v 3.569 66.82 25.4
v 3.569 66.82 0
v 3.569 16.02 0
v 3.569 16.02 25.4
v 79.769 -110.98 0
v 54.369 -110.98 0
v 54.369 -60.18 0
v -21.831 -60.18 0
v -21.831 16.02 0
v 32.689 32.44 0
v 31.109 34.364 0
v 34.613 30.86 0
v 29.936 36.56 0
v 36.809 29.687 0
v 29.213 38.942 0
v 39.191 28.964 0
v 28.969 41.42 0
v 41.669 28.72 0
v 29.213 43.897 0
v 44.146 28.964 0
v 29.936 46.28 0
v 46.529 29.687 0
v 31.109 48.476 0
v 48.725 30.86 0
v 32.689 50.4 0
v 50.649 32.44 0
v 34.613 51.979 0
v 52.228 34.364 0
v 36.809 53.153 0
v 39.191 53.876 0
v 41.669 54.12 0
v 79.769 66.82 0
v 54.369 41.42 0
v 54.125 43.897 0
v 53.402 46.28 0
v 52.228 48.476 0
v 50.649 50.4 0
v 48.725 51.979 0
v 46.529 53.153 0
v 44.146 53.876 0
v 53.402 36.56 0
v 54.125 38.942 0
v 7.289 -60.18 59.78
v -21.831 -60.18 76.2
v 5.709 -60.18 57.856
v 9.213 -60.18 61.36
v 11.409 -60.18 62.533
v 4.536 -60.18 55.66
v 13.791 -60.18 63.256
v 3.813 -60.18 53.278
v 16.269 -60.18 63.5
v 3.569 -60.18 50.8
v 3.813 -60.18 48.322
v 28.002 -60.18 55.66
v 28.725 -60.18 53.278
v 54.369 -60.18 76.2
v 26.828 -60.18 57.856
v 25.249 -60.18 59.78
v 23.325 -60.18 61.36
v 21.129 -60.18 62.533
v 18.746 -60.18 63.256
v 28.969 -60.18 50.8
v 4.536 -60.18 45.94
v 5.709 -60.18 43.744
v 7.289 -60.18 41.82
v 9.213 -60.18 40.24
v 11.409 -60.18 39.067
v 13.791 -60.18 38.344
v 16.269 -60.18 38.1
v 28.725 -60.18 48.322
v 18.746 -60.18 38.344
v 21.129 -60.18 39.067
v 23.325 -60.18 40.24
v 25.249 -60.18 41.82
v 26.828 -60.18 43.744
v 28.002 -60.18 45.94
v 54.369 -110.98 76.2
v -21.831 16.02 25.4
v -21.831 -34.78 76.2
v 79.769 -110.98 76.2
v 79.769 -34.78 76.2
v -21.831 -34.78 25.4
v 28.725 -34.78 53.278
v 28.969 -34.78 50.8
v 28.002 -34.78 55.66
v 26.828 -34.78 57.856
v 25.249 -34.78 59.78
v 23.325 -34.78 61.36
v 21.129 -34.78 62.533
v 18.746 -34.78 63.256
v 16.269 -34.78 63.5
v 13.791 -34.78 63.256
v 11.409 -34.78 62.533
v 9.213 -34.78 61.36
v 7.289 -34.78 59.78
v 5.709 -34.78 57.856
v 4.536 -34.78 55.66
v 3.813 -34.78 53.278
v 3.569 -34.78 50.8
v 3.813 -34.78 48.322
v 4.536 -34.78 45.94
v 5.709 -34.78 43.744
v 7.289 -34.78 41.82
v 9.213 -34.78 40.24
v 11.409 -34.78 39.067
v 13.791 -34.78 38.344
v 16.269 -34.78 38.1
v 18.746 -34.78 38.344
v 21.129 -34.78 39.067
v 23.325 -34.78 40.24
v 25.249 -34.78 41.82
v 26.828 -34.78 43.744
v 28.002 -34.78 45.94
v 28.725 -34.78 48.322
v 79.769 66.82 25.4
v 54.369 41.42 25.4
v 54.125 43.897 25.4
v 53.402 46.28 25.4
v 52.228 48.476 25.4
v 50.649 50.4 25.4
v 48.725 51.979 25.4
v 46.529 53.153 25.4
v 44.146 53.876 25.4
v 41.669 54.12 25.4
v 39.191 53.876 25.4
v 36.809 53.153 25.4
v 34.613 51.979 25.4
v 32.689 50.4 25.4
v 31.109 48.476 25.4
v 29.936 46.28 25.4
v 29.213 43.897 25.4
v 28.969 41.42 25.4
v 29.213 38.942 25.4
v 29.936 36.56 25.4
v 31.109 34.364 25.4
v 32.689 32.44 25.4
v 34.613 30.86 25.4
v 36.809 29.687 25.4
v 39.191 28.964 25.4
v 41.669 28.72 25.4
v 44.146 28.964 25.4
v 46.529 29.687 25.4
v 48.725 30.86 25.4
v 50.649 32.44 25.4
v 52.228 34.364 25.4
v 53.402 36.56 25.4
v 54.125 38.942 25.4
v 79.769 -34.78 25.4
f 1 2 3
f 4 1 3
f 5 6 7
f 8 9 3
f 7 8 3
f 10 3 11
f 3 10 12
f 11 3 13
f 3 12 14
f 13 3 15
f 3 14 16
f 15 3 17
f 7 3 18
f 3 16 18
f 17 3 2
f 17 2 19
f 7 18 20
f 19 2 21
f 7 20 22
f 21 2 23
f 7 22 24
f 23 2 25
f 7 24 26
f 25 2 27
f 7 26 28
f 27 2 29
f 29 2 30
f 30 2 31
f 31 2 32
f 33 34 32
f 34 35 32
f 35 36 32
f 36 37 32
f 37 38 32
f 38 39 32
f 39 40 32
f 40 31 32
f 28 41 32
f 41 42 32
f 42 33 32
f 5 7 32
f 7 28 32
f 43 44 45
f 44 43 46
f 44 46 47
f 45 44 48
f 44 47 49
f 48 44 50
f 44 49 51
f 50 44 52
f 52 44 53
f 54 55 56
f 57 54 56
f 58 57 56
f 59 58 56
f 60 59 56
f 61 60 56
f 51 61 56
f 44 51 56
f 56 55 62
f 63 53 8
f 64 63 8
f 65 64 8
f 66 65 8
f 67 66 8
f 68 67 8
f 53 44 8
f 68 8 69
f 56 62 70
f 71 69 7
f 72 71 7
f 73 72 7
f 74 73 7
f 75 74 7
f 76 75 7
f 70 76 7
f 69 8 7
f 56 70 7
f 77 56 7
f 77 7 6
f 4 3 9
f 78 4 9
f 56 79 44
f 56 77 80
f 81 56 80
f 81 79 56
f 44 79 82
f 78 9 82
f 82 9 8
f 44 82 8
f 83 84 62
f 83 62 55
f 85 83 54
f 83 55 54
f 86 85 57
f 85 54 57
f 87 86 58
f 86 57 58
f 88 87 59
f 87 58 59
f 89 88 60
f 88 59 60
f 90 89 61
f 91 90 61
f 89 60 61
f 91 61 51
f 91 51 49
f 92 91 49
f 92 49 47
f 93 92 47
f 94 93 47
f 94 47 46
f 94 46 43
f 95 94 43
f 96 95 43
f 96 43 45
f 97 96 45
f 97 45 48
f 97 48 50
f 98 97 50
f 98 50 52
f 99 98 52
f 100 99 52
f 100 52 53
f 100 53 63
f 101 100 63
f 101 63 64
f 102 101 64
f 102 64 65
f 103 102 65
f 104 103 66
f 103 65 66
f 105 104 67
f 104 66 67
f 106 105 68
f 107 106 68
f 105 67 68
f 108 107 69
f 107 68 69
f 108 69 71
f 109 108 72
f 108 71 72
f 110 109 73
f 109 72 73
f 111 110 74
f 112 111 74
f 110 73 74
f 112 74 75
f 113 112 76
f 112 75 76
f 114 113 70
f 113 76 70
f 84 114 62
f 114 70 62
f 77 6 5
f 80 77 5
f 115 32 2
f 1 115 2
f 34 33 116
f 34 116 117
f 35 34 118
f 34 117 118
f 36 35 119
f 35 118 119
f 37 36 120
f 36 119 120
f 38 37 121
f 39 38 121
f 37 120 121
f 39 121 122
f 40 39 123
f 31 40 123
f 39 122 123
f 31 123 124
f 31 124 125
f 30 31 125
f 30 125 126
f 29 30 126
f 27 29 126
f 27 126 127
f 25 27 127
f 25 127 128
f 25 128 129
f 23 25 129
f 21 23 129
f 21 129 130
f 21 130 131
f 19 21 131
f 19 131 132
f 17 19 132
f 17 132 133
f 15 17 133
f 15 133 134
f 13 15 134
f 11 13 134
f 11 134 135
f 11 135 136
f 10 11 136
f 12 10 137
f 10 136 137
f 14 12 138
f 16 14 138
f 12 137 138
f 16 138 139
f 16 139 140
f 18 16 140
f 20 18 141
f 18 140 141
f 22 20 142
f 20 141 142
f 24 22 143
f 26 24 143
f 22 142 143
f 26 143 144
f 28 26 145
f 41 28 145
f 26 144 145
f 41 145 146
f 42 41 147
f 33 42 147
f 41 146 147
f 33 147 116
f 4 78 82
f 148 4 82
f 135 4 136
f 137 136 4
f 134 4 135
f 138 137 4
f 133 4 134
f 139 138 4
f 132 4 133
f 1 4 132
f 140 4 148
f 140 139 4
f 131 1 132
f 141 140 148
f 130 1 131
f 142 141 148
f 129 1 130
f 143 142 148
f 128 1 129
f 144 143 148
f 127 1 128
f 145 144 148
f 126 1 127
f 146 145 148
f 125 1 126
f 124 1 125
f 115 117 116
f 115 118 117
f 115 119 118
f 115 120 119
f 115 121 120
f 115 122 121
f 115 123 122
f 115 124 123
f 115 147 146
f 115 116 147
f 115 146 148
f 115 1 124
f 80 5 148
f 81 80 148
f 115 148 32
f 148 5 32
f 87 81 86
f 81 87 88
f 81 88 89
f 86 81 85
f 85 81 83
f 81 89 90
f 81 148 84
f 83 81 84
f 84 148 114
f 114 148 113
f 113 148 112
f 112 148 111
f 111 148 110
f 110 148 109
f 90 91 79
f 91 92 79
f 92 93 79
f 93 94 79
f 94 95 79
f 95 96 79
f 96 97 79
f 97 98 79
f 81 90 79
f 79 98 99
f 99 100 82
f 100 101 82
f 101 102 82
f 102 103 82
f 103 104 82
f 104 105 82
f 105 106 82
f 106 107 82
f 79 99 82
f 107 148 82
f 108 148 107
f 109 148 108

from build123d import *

# Parameters (mm, degrees)
F1_DEPTH = 25.4
F2_DEPTH = 76.2
F3_R     = 12.7
F4_DEPTH = 127.001
F5_R     = 12.7
F6_DEPTH = 25.401


with BuildPart() as f1:
    # F0 (on Top) → F1 (new body)
    with BuildSketch(Plane.XY):
        Polygon((79.768824, 66.81983), (3.568824, 66.81983), (3.568824, 16.01983), (-21.831176, 16.01983), (-21.831176, -34.78017), (79.768824, -34.78017), align=None)
    extrude(amount=F1_DEPTH)

    # F0 (on Top) → F2 (join)
    with BuildSketch(Plane.XY):
        Polygon((79.768824, -110.98017), (79.768824, -34.78017), (-21.831176, -34.78017), (-21.831176, -60.18017), (54.368824, -60.18017), (54.368824, -110.98017), align=None)
    extrude(amount=F2_DEPTH)

    # F3 (on face) → F4 (cut, through all)
    with BuildSketch(Plane.XZ.offset(60.18017)):
        with Locations((16.268824, 50.8)):
            Circle(F3_R)
    extrude(amount=-F4_DEPTH, mode=Mode.SUBTRACT)

    # F5 (on face) → F6 (cut, through all)
    with BuildSketch(Plane.XY.offset(25.4)):
        with Locations((41.668824, 41.41983)):
            Circle(F5_R)
    extrude(amount=-F6_DEPTH, mode=Mode.SUBTRACT)


solid = f1.part
